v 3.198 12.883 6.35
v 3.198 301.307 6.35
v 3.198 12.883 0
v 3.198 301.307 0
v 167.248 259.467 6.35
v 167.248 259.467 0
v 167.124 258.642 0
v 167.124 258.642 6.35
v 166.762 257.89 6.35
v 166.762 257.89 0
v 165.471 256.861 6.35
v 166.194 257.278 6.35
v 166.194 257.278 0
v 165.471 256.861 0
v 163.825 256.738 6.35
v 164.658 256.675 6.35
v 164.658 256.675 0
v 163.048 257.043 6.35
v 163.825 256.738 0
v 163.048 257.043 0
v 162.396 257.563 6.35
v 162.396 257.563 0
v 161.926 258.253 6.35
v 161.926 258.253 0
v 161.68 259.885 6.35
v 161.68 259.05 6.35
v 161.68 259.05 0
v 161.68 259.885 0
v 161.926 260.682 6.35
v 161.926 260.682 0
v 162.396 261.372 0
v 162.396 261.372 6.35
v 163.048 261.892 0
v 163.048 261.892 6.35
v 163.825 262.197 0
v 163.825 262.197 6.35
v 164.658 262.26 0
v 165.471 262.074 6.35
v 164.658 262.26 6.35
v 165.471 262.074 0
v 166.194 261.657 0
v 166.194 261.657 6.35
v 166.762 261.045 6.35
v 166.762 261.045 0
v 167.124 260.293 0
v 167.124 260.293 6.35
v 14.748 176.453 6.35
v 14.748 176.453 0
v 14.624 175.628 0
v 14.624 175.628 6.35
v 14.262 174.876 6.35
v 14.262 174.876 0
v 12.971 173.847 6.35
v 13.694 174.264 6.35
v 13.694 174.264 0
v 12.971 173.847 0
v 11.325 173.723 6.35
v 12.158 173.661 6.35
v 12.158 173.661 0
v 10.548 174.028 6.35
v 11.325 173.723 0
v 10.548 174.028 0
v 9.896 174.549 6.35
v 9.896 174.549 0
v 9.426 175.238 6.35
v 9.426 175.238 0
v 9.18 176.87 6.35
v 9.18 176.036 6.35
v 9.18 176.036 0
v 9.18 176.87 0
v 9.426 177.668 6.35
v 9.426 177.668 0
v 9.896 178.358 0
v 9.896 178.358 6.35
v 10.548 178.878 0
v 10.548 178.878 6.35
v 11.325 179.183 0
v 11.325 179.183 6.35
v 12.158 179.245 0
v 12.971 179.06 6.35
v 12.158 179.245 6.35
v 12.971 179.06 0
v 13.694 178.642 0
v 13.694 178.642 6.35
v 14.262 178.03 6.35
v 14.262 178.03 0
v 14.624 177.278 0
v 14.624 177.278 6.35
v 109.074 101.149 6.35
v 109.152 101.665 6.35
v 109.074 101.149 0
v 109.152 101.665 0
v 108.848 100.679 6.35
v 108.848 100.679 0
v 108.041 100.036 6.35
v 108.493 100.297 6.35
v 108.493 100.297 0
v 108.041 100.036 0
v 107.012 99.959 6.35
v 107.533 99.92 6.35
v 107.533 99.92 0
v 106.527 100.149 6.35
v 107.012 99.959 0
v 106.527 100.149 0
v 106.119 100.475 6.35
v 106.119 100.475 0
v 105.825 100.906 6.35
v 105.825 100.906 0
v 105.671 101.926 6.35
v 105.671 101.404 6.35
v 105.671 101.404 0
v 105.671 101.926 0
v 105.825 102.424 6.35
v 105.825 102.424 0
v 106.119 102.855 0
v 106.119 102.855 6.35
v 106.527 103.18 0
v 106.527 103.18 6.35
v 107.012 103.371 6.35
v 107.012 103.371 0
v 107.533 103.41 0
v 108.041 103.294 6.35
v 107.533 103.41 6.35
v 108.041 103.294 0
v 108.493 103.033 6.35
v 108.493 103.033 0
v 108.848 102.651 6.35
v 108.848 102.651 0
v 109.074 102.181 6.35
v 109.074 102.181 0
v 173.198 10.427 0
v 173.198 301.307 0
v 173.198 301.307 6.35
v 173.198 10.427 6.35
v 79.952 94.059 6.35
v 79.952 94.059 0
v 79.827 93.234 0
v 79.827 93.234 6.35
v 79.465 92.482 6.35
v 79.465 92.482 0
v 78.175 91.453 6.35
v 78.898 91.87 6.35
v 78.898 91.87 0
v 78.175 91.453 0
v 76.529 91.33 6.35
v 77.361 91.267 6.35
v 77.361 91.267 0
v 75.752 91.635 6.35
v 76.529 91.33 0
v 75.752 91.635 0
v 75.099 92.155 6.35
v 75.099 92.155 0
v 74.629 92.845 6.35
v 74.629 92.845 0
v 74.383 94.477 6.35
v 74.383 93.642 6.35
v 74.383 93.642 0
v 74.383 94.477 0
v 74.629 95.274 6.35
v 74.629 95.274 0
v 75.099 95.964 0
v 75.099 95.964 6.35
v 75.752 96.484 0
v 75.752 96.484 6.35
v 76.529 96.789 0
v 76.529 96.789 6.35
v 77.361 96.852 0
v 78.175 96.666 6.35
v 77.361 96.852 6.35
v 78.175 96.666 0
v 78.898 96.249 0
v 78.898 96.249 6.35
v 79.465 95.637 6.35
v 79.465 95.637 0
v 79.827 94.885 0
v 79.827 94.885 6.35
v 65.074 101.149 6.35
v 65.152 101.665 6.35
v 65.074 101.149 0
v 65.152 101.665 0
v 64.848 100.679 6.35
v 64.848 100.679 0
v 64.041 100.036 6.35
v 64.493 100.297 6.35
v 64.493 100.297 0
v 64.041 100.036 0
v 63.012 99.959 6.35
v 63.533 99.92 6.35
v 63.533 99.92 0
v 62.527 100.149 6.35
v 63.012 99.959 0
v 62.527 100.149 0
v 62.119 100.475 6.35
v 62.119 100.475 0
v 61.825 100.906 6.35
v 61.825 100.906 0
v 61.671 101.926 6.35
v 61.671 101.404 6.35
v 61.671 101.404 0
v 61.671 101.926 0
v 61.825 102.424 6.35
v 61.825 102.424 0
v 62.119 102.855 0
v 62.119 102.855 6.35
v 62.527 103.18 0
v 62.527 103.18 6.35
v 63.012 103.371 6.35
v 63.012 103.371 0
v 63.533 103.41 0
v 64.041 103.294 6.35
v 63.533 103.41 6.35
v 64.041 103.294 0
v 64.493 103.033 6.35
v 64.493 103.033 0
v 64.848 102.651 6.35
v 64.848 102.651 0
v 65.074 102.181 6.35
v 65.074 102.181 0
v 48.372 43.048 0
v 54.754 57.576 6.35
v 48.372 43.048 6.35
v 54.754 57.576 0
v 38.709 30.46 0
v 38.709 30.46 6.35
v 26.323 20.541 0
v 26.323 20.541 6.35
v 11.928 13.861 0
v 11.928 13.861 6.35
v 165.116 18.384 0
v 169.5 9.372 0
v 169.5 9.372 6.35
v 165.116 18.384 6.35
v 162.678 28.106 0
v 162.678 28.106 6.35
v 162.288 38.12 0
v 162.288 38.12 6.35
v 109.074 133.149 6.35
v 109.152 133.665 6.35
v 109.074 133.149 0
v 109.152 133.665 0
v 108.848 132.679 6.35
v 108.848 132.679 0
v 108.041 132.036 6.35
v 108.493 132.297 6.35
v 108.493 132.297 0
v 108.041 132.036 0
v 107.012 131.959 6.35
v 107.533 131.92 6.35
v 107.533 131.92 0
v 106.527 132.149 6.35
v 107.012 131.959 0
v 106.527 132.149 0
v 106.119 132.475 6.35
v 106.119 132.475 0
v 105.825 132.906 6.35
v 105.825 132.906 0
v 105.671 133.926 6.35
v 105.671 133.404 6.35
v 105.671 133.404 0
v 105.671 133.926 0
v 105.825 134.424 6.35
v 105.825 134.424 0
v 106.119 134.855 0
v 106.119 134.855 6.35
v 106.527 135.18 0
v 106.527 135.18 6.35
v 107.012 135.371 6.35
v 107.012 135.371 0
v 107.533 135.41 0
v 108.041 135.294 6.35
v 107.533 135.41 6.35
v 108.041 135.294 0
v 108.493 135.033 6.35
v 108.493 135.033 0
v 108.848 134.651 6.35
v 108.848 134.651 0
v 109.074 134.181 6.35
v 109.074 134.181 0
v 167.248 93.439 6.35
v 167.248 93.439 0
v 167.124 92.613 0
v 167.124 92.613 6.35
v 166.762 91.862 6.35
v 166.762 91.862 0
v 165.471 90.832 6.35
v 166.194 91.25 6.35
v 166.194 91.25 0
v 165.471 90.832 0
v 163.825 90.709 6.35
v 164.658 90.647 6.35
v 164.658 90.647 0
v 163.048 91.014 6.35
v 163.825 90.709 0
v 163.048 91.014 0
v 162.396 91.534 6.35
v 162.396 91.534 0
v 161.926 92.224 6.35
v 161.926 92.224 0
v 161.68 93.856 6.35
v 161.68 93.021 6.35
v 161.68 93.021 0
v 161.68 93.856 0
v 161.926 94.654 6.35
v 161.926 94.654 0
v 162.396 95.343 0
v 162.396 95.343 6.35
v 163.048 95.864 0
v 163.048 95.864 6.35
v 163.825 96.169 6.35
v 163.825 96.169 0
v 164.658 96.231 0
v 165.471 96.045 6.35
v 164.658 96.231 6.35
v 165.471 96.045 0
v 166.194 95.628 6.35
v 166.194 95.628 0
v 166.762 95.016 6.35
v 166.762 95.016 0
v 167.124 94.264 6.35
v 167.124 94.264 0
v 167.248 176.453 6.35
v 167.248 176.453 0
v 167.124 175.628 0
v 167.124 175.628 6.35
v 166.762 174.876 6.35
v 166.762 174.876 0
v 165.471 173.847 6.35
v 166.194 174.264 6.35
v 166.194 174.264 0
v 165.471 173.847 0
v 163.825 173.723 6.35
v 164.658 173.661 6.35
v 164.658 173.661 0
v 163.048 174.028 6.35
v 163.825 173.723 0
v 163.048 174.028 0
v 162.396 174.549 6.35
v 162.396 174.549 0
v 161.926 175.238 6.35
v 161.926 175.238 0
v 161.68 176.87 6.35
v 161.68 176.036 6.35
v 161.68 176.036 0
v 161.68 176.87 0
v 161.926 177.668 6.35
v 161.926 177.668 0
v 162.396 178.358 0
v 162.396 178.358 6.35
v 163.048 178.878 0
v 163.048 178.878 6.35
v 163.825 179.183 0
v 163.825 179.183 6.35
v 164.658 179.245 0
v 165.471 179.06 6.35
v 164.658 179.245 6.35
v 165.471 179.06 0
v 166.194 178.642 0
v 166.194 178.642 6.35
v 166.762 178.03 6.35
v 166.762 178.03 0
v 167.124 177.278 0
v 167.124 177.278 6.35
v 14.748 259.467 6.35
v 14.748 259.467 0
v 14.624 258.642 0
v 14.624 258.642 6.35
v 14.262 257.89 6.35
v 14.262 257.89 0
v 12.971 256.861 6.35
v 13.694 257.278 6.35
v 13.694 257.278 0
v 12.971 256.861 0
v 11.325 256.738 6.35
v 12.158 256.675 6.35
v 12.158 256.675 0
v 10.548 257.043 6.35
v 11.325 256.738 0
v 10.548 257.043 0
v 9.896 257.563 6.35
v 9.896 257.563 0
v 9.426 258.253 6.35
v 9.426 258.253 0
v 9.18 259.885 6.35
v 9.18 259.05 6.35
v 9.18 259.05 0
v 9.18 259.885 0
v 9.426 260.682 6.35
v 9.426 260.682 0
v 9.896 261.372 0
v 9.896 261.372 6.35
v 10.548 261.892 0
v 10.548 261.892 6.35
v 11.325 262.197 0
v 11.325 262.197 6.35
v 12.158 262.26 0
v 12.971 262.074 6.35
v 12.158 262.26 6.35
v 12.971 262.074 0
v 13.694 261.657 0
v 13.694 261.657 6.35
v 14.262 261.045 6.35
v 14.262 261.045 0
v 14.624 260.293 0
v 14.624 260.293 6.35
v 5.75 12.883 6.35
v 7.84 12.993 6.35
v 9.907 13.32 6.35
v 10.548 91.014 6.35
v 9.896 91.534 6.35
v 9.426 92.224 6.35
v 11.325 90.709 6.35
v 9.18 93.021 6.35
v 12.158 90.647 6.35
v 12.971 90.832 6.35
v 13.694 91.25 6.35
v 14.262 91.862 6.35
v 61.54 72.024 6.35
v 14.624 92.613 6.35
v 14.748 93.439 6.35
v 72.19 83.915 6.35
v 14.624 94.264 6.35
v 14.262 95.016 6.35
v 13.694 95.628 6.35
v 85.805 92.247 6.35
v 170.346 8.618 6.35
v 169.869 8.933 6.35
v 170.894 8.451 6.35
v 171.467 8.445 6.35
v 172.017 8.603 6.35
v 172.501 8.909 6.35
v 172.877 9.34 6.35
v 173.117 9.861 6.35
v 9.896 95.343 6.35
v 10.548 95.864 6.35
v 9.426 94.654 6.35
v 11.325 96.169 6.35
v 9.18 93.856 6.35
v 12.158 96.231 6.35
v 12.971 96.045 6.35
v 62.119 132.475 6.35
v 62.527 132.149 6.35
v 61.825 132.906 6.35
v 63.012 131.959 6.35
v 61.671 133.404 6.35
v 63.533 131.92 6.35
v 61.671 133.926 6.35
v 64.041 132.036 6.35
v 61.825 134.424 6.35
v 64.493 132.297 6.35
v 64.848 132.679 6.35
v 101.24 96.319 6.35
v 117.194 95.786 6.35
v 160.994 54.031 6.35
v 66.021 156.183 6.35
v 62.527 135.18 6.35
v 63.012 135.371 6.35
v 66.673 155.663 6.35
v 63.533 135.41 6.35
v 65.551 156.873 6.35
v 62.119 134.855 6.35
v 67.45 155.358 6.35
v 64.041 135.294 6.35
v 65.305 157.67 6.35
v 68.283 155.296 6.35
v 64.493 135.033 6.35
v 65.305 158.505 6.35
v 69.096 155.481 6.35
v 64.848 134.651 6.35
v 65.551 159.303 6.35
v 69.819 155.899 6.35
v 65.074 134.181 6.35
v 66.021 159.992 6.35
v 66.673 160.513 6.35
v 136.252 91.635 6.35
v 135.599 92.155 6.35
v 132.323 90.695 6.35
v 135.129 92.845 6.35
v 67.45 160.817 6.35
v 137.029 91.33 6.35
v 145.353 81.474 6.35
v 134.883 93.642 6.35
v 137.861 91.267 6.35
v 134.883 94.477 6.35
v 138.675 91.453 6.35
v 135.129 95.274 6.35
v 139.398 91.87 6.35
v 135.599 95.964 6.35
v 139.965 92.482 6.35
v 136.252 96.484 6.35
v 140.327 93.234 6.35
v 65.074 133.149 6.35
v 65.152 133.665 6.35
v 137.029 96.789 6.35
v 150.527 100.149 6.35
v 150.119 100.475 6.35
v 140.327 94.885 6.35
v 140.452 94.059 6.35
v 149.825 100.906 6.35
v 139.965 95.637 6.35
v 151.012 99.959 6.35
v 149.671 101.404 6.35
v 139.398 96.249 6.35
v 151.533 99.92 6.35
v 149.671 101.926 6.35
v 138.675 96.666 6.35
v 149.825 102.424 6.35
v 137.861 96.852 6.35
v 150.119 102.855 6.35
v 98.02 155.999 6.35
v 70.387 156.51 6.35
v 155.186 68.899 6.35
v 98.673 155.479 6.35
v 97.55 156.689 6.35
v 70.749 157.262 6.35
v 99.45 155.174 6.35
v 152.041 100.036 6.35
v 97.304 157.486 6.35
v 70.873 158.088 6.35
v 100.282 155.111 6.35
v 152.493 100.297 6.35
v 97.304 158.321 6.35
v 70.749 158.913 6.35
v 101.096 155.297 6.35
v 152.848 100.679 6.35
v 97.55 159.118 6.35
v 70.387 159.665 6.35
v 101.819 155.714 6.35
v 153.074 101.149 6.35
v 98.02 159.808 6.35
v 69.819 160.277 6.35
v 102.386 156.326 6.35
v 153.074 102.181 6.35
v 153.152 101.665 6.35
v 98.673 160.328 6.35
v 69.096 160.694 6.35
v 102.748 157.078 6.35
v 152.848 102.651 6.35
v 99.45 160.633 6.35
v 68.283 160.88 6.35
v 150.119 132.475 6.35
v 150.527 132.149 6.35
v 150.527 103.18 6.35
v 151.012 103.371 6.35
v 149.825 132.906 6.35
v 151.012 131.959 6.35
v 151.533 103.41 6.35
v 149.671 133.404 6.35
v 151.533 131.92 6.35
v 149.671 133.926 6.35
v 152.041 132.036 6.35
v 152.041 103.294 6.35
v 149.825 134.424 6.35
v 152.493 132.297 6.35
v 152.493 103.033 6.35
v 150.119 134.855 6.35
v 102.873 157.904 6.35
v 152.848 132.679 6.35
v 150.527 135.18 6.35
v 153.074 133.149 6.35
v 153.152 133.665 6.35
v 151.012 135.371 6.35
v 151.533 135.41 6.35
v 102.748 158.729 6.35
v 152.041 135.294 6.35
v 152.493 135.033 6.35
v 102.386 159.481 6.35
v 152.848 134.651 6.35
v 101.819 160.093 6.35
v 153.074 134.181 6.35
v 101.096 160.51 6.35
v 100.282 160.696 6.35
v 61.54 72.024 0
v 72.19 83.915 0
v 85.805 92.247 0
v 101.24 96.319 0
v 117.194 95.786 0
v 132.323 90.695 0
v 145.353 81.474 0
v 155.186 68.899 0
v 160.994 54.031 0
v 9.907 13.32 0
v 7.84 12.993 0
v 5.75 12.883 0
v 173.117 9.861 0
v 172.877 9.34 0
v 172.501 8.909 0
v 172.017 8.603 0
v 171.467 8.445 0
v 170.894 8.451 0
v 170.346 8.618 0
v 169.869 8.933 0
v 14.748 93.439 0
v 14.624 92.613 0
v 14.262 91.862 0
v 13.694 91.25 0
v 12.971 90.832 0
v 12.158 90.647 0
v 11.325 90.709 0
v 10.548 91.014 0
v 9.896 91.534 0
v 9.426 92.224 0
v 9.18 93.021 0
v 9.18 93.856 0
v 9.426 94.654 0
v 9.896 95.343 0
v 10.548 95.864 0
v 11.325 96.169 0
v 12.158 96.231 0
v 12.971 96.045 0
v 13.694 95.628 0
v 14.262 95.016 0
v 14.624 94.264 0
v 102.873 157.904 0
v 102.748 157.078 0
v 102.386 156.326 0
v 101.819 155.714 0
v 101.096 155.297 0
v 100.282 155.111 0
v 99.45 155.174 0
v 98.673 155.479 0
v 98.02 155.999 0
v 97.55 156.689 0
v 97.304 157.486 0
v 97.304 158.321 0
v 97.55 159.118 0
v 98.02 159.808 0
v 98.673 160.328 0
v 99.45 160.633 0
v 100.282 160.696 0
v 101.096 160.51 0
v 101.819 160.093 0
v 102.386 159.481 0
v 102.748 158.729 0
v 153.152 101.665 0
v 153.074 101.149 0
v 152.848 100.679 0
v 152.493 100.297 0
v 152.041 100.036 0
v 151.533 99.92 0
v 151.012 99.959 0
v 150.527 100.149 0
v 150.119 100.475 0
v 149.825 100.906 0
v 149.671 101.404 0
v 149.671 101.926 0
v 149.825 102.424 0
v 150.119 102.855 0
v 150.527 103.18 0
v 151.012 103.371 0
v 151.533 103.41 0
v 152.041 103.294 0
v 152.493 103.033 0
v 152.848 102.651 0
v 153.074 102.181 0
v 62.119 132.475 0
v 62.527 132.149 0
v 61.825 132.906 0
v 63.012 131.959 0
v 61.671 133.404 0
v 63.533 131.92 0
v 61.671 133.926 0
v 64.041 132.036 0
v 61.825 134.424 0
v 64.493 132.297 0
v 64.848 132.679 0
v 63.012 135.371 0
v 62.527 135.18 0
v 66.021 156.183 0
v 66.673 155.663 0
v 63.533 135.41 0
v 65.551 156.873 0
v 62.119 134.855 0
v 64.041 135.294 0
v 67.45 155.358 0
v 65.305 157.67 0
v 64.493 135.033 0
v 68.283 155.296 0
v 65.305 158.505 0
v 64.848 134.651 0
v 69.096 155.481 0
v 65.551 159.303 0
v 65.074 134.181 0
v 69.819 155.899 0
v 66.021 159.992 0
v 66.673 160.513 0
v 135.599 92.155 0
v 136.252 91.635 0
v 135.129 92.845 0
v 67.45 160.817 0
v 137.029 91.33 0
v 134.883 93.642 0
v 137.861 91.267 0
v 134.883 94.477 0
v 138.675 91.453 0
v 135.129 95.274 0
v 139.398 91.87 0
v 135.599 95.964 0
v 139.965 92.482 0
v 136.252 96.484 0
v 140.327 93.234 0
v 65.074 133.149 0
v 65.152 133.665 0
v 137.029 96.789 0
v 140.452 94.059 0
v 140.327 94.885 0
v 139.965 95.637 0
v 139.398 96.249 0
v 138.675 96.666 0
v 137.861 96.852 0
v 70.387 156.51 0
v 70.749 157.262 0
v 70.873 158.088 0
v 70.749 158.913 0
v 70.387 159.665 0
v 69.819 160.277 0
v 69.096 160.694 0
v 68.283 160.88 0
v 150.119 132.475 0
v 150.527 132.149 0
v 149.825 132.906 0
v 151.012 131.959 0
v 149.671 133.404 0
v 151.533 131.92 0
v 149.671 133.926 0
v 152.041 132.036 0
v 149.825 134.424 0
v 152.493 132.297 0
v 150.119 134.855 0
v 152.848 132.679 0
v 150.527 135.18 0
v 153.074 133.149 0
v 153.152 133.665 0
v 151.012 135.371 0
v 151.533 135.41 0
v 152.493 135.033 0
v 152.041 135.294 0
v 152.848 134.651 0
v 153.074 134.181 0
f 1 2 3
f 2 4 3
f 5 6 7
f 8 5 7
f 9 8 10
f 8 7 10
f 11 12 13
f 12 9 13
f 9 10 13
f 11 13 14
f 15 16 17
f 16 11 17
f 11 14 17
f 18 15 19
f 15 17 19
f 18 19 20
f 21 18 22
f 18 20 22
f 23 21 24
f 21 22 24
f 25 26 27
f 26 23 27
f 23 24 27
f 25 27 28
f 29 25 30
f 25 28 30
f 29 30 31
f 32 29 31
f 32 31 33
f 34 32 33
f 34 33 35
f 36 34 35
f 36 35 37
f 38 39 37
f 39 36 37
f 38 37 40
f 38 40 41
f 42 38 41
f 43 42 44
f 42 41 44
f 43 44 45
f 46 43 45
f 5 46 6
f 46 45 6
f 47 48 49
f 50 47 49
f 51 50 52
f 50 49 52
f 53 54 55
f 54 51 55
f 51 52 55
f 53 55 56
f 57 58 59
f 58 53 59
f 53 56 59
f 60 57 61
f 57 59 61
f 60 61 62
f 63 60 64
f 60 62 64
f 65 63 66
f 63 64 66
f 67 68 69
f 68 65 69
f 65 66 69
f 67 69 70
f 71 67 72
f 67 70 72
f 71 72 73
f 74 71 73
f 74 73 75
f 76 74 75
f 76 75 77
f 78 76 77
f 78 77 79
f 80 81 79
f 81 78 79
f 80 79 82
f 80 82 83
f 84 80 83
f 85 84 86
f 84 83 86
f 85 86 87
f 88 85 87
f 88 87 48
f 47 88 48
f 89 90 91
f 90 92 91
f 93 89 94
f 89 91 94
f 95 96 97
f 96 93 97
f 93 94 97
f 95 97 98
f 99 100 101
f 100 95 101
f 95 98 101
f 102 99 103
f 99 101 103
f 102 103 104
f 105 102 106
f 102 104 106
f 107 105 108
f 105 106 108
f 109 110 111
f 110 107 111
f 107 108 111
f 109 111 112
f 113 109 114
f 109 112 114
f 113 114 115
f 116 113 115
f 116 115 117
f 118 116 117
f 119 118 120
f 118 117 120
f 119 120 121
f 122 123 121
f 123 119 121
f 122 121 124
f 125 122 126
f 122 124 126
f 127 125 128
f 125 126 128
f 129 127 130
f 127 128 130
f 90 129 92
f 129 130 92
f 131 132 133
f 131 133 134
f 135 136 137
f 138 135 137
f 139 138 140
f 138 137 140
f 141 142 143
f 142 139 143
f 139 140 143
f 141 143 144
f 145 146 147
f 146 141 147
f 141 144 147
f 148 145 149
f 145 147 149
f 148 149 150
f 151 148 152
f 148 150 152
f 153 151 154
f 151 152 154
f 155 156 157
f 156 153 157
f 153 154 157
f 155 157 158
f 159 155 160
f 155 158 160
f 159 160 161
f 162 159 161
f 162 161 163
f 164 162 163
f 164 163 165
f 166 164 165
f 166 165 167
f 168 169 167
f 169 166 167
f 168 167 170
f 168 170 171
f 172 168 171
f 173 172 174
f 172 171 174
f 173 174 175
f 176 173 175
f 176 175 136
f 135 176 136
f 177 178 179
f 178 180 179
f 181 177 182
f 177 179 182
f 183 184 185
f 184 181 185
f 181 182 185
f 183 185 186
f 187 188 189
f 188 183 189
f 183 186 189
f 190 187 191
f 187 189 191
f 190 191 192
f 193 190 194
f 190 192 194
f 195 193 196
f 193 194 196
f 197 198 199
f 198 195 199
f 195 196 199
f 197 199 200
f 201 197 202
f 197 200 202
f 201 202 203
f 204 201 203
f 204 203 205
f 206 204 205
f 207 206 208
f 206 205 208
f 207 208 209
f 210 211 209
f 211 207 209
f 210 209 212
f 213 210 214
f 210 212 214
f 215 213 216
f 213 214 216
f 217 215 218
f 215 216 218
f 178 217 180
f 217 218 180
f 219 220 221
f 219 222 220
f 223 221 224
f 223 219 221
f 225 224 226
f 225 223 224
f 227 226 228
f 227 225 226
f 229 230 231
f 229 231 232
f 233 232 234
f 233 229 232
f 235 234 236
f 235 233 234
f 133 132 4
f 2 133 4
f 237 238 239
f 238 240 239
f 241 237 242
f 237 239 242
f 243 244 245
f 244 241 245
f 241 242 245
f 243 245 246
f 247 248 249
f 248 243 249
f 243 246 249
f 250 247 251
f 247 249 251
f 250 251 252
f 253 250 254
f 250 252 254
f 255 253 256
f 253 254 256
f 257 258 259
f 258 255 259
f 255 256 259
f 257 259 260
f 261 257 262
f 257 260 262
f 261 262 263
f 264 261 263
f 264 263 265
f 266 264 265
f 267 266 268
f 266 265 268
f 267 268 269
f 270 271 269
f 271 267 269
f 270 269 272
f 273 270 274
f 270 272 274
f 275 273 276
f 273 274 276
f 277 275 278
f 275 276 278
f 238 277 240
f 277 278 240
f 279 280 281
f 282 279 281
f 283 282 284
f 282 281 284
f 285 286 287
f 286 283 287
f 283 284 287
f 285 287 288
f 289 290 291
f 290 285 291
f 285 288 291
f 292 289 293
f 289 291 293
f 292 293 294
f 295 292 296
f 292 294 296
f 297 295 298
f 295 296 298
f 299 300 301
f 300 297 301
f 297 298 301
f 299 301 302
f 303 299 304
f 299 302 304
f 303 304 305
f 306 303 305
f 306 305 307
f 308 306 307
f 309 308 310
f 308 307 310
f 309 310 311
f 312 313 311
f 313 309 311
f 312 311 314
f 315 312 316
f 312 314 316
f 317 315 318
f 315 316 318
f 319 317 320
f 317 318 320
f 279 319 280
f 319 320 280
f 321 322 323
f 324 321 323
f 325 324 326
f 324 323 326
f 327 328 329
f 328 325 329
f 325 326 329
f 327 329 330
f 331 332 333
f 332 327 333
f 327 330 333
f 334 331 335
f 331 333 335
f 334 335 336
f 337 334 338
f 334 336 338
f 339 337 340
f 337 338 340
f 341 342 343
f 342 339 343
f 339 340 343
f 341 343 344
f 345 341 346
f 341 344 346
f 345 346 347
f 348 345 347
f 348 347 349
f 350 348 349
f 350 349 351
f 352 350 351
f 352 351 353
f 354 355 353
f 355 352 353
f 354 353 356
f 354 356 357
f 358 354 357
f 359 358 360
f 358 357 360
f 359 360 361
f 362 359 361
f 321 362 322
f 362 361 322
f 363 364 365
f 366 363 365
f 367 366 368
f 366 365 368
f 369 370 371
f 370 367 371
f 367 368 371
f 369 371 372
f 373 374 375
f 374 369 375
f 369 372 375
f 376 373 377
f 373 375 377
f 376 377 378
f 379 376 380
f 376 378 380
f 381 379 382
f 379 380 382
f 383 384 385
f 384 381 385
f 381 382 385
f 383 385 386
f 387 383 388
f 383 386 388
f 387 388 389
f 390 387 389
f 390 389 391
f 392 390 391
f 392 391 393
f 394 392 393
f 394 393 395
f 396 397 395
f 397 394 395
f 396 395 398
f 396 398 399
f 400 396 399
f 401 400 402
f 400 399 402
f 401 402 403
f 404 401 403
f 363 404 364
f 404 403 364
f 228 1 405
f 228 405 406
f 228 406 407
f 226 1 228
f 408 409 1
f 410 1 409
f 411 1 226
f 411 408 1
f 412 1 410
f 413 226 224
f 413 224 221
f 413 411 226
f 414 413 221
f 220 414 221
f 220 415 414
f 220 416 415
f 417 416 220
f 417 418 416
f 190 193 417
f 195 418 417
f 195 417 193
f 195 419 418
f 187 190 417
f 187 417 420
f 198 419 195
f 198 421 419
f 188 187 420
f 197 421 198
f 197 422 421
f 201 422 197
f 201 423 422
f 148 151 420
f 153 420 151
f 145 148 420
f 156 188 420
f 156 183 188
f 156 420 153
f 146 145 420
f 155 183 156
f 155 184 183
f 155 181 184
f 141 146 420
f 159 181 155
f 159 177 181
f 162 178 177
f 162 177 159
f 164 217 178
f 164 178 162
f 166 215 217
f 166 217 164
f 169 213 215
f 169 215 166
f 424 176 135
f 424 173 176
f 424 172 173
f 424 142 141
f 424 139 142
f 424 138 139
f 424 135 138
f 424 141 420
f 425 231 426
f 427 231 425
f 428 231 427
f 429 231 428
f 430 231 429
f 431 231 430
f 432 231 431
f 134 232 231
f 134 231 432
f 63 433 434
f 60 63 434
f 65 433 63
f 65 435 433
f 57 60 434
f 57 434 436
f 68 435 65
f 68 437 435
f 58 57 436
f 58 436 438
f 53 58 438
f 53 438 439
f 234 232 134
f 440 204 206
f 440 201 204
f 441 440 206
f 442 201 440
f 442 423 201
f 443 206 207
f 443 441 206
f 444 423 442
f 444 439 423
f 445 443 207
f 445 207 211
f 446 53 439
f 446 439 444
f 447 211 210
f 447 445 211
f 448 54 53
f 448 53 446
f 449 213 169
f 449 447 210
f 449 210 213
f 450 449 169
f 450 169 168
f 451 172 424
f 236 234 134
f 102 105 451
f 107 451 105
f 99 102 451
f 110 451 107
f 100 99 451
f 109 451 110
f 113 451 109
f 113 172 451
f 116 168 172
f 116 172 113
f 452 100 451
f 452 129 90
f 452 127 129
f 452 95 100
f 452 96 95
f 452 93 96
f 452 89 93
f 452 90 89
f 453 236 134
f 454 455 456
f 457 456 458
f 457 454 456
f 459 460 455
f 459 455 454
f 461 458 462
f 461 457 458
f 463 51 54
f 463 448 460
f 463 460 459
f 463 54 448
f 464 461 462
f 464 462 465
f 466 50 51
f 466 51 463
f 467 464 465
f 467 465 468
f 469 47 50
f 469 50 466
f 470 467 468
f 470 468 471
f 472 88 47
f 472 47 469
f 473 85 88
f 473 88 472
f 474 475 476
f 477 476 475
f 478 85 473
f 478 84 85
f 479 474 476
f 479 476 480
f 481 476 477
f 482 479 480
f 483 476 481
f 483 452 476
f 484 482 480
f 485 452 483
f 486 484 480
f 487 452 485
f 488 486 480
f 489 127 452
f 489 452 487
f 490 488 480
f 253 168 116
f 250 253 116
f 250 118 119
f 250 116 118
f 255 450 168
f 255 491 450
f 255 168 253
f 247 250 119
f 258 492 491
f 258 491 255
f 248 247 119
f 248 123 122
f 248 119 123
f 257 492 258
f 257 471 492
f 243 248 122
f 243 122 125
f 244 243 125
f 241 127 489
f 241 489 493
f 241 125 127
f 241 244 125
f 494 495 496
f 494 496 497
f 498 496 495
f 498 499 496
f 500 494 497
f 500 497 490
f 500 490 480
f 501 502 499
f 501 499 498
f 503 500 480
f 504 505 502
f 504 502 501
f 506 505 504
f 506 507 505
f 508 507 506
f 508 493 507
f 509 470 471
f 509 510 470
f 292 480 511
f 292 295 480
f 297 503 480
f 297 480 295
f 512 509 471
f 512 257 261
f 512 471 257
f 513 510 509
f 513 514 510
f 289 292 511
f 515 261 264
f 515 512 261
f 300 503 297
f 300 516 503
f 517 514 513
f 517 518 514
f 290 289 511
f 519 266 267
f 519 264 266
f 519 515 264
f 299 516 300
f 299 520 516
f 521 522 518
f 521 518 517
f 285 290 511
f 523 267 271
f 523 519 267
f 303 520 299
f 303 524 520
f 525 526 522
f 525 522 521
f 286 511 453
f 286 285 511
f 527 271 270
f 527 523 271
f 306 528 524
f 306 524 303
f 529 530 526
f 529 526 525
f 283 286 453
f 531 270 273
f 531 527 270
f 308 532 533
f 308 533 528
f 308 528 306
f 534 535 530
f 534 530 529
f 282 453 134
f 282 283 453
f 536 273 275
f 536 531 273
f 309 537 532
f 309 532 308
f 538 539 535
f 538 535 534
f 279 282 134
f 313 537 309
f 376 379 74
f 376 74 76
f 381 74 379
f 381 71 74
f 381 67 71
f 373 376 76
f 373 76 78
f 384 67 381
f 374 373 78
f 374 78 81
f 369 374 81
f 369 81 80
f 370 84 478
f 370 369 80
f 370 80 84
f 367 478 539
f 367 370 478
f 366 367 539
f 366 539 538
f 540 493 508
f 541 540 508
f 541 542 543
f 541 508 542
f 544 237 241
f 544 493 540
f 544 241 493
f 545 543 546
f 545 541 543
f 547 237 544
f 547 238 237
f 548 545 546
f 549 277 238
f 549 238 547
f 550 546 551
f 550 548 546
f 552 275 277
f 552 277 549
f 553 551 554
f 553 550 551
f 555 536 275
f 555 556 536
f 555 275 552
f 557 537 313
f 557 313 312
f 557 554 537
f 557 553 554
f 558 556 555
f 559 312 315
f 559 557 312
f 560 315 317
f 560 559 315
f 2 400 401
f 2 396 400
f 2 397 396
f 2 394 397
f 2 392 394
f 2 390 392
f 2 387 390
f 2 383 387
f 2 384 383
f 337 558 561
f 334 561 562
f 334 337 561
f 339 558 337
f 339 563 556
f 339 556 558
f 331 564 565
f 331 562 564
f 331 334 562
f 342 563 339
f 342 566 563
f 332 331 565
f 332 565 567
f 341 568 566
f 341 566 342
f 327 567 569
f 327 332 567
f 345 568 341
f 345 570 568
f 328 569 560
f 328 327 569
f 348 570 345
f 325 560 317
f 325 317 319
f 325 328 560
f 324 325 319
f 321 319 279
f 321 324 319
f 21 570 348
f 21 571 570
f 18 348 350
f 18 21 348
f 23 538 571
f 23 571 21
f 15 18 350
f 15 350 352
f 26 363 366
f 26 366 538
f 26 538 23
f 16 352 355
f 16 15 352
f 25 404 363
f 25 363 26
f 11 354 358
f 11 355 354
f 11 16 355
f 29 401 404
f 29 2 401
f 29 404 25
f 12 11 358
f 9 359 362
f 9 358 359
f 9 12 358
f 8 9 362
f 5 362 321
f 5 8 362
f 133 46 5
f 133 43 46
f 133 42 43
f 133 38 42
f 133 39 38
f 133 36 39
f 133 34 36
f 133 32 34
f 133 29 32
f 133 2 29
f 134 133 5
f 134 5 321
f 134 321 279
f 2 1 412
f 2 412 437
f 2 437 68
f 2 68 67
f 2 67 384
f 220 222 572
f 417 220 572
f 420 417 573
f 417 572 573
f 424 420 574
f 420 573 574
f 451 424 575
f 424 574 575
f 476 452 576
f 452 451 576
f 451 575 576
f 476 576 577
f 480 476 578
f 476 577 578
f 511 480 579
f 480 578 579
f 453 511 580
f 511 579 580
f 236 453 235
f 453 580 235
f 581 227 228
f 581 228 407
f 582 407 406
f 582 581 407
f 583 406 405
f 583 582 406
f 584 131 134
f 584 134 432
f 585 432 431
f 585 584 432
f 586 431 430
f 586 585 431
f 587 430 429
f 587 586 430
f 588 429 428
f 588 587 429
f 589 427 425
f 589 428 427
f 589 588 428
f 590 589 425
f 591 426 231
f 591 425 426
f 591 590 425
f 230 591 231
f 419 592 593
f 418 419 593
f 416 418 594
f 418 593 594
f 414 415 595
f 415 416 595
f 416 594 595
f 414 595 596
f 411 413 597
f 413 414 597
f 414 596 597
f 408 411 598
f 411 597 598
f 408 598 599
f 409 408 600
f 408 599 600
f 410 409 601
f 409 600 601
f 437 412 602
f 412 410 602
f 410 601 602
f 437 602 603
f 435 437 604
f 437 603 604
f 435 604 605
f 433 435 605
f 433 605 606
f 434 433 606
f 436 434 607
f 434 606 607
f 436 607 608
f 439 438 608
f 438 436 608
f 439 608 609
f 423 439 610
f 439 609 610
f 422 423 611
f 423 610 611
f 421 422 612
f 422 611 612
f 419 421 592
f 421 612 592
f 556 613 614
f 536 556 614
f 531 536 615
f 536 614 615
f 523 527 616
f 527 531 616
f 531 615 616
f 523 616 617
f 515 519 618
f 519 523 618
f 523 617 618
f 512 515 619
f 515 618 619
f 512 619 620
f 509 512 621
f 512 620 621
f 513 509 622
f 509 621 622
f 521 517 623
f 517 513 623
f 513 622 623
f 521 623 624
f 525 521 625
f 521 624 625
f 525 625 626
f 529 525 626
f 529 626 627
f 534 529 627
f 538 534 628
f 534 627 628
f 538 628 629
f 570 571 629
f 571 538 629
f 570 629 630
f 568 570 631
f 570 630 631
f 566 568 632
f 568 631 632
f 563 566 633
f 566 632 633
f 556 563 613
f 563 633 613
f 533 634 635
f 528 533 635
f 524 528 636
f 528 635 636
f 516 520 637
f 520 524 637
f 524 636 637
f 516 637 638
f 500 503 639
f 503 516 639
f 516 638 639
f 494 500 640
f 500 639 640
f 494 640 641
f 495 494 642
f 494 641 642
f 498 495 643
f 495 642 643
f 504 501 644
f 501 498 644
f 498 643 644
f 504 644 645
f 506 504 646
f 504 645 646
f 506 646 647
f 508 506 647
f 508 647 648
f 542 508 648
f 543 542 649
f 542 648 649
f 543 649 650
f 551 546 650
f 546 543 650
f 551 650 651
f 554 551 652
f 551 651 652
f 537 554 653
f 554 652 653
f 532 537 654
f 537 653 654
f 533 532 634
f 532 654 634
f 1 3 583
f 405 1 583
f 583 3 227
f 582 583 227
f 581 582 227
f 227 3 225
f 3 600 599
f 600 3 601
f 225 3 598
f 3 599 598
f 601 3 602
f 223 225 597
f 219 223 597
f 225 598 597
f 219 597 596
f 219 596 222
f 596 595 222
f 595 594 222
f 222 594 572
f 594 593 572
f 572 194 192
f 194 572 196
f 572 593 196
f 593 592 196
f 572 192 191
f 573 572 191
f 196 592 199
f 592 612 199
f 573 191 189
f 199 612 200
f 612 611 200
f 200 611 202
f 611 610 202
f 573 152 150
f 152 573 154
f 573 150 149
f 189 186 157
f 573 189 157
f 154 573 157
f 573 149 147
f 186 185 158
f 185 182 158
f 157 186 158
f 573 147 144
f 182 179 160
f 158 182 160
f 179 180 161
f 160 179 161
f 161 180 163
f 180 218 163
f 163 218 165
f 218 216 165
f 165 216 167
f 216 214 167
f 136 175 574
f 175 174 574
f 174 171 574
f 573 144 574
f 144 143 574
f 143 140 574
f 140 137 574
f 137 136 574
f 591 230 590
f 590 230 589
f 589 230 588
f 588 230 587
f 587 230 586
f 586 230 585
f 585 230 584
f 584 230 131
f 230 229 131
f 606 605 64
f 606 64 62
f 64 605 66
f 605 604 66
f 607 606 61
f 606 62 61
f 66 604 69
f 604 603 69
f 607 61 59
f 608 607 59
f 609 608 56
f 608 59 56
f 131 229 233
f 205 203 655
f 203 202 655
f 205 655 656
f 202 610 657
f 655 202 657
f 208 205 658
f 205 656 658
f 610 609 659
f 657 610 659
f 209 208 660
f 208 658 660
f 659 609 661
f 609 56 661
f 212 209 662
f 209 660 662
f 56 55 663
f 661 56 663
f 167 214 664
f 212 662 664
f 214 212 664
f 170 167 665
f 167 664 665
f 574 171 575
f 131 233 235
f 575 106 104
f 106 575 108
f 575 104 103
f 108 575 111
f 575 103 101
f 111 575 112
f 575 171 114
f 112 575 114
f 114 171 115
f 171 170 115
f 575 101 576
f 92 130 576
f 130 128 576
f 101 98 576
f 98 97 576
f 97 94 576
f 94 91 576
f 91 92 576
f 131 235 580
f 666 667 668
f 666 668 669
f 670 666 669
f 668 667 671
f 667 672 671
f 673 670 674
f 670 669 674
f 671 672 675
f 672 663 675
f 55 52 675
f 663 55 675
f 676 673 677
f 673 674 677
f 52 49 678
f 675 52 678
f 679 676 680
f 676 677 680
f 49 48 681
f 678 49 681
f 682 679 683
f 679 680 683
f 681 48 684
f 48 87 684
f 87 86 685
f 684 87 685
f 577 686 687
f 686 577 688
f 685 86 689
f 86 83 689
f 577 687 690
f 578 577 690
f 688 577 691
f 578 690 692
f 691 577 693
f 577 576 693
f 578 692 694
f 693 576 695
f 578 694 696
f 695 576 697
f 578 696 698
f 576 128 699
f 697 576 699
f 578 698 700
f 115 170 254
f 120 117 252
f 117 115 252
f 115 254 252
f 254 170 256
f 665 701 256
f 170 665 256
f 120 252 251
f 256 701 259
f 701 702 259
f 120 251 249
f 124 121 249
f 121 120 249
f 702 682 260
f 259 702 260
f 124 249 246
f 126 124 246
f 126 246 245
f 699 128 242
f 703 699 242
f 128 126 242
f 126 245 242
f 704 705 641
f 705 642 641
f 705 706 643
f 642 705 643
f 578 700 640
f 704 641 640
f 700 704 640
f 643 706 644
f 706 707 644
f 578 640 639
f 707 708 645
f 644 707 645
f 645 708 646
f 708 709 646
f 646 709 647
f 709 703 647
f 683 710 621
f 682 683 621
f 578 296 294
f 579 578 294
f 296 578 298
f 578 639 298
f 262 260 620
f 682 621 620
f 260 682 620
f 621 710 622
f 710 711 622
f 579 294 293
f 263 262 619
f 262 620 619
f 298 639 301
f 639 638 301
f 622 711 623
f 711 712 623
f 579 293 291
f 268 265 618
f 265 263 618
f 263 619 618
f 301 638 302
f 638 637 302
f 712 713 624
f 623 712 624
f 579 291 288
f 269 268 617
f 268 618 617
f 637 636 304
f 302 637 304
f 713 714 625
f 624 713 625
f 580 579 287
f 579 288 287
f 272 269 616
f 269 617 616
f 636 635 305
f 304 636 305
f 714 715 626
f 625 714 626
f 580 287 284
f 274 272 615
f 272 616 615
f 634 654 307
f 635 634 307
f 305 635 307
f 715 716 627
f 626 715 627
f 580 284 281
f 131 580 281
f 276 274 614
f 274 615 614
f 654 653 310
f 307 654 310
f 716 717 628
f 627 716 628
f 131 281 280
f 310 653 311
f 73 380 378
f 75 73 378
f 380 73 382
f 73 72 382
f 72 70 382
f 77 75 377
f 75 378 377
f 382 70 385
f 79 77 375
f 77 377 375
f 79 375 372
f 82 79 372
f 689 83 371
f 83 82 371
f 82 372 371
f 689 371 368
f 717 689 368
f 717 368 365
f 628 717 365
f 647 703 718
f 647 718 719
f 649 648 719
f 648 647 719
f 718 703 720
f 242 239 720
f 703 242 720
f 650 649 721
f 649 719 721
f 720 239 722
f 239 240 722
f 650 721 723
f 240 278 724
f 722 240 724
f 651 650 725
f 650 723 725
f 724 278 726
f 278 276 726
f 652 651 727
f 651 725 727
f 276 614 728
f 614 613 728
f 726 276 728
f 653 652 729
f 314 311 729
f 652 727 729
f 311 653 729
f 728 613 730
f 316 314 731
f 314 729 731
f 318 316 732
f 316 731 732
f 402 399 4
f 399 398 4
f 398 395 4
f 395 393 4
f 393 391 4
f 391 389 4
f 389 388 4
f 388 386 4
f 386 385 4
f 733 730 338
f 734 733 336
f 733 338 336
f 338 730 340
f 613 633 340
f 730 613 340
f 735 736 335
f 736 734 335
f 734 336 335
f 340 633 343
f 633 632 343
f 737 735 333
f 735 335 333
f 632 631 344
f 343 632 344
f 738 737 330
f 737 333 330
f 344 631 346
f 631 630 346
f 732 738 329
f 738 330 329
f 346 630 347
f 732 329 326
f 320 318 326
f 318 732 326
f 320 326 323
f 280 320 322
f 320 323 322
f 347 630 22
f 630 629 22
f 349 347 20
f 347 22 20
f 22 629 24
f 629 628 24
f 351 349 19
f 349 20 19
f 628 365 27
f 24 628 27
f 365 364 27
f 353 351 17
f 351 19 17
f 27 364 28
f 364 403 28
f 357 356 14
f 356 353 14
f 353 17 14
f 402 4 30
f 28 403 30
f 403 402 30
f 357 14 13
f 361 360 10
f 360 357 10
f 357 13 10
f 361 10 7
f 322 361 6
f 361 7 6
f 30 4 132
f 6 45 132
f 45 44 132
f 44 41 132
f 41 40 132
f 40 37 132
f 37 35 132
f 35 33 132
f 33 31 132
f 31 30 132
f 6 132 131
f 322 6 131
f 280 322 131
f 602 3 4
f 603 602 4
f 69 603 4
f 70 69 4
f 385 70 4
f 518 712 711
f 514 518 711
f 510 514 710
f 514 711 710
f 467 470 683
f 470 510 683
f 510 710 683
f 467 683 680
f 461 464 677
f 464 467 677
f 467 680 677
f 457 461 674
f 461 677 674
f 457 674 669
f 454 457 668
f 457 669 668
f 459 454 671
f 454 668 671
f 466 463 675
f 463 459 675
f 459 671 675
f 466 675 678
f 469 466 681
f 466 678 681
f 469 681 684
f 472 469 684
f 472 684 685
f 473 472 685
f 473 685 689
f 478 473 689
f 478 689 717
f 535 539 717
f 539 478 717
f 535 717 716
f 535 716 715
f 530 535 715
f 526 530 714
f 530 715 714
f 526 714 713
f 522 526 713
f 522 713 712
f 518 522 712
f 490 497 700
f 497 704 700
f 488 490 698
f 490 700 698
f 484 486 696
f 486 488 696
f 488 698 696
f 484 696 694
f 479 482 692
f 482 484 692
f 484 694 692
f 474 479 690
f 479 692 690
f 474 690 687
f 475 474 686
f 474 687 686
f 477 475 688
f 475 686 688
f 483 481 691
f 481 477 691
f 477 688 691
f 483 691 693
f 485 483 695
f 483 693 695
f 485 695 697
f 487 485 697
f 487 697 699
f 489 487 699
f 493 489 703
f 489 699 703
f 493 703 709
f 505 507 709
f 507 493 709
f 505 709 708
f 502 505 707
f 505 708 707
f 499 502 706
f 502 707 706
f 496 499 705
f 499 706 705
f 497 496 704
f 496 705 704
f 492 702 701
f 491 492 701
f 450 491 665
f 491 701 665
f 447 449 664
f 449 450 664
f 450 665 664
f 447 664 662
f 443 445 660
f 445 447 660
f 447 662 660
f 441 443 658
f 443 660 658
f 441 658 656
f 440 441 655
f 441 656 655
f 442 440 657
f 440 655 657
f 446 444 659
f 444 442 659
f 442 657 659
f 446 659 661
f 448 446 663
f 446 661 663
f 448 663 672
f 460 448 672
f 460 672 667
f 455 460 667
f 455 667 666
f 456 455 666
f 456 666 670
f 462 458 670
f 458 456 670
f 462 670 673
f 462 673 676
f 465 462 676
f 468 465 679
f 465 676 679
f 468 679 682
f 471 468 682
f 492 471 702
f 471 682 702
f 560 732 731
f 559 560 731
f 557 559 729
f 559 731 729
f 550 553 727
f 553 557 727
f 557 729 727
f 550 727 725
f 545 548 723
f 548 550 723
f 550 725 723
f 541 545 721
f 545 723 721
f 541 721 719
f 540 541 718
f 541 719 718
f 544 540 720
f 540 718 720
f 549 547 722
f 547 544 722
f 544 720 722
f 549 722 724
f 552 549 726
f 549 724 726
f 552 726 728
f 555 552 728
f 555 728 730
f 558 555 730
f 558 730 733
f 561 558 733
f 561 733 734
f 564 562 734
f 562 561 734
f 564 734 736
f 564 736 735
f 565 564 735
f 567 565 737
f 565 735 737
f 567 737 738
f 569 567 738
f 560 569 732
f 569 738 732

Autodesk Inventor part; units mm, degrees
ref_plane "YZ Plane" through (0, 0, 0) normal (1, 0, 0) x (0, 1, 0)
ref_plane "XZ Plane" through (0, 0, 0) normal (0, 1, 0) x (-1, 0, 0)
ref_plane "XY Plane" through (0, 0, 0) normal (0, 0, 1) x (1, 0, 0)
sketch "Sketch1" plane through (0, 0, 0) normal (0, 0, 1) x (1, 0, 0)
  line L0 (177.0985, -0.0099) -> (177.0985, 299.9901)
  line L1 (177.0985, 299.9901) -> (-0.7015, 299.9901) construction
  line L2 (-0.7015, 299.9901) -> (-0.7015, 12.8831)
  line L3 (3.1985, 12.8831) -> (5.7502, 12.8831)
  arc A0 (162.2875, 38.1203) -> (54.7536, 57.5761) centre (107.4018, 41.6649) ccw
  arc A1 (11.9285, 13.8613) -> (54.7536, 57.5761) centre (-8.4768, 76.6855) ccw
  arc A2 (5.7502, 12.8831) -> (11.9285, 13.8613) centre (5.7502, 32.8831) ccw
  circle A3 centre (164.4485, 93.4388) radius 2.8
  circle A4 centre (164.4485, 176.4531) radius 2.8
  circle A5 centre (164.4485, 259.4675) radius 2.8
  circle A6 centre (11.9485, 259.4675) radius 2.8
  circle A7 centre (11.9485, 176.4531) radius 2.8
  circle A8 centre (11.9485, 93.4388) radius 2.8
  arc A9 (162.2875, 38.1203) -> (169.4999, 9.3715) centre (210.7223, 34.9923) ccw
  line L4 (83.4018, 393.7) -> (83.4018, -22.225) construction
  line L5 (83.4018, -22.225) -> (131.4018, -22.225) construction
  line L6 (131.4018, -22.225) -> (131.4018, 393.7) construction
  line L7 (131.4018, 393.7) -> (83.4018, 393.7) construction
  line L8 (83.4018, 393.7) -> (131.4018, -22.225) construction
  line L9 (83.4018, -22.225) -> (131.4018, 393.7) construction
  line L10 (36.4143, 133.6649) -> (149.1268, 133.6649) construction
  line L11 (41.1768, 101.6649) -> (144.3643, 101.6649) construction
  circle A10 centre (63.4018, 133.6649) radius 1.75
  circle A11 centre (63.4018, 101.6649) radius 1.75
  line L12 (63.4018, 133.6649) -> (63.4018, 101.6649) construction
  line L13 (107.4018, 31.6649) -> (107.4018, 185.7375) construction
  circle A12 centre (107.4018, 133.6649) radius 1.75
  circle A13 centre (107.4018, 101.6649) radius 1.75
  circle A14 centre (151.4018, 133.6649) radius 1.75
  circle A15 centre (151.4018, 101.6649) radius 1.75
  line L14 (151.4018, 133.6649) -> (151.4018, 101.6649) construction
  line L15 (173.1985, 301.3071) -> (173.1985, 10.4273)
  line L16 (177.0985, -0.0099) -> (177.0985, 42.269)
  line L17 (3.1985, 301.3071) -> (3.1985, 12.8831)
  line L18 (-0.7015, 12.8831) -> (-0.7015, 42.269)
  line L19 (24.0985, 301.3071) -> (-0.2015, 301.3071) projected
  line L20 (3.1985, 301.3071) -> (173.1985, 301.3071)
  line L21 (177.0985, 301.3071) -> (177.0985, 299.9901)
  line L22 (177.0985, 299.9901) -> (-0.7015, 299.9901) construction
  line L23 (-0.7015, 299.9901) -> (-0.7015, 301.3071)
  circle A16 centre (107.4018, 41.6649) radius 50.5415 projected
  circle A17 centre (137.6518, 94.0594) radius 2.8
  line L24 (137.6518, 94.0594) -> (107.4018, 41.6649) construction
  line L25 (107.4018, 41.6649) -> (75.7506, 96.4865) construction
  circle A18 centre (77.1518, 94.0594) radius 2.8
  arc A19 (169.4999, 9.3715) -> (173.1985, 10.4273) centre (171.1985, 10.4273) ccw
  circle A20 centre (100.0728, 157.9036) radius 4.75 projected
  circle A21 centre (68.0733, 158.0877) radius 4.75 projected
  circle A22 centre (100.0728, 157.9036) radius 2.8
  circle A23 centre (68.0733, 158.0877) radius 2.8
  point P0 (0, 0)
  point P1 (152.4018, -0.0099)
  point P2 (173.1985, 42.269)
  point P3 (3.1985, 42.269)
  point P4 (174.0985, 3.1425)
  point P5 (24.0985, 301.3071)
  point P6 (173.1985, 4.2079)
  dimension "d0" = 177.8
  dimension "d1" = 300
  dimension "d9" = 258.3252
  dimension "d10" = 55
  dimension "d11" = 108.1033
  dimension "d12" = 48
  dimension "d13" = 32
  dimension "d14" = 3.5
  dimension "d15" = 3.5
  dimension "d16" = 20
  dimension "d17" = 3.5
  dimension "d18" = 3.5
  dimension "d19" = 3.5
  dimension "d20" = 3.5
  dimension "d21" = 20
  dimension "d22" = 3.9
  dimension "d23" = 3.9
  dimension "d24" = 60
  dimension "d25" = 5.6
  dimension "d26" = 60.5
  dimension "d27" = 60
  dimension "d28" = 60
  dimension "d29" = 5.6
  dimension "d30" = 60.5
  dimension "d31" = 2
  dimension "d32" = 5.6
  dimension "d33" = 5.6
extrude "Extrusion1" add sketch "Sketch1" along normal blind 6.35 contours L17 L19 L20 L15 A19 A9 A0 A1 A2 L3 | A20 | A21
equation "\"d21\" = d16"
equation "\"d30\" = d26"
properties part number "Lower Deck" material "Polycarbonate, Clear"
